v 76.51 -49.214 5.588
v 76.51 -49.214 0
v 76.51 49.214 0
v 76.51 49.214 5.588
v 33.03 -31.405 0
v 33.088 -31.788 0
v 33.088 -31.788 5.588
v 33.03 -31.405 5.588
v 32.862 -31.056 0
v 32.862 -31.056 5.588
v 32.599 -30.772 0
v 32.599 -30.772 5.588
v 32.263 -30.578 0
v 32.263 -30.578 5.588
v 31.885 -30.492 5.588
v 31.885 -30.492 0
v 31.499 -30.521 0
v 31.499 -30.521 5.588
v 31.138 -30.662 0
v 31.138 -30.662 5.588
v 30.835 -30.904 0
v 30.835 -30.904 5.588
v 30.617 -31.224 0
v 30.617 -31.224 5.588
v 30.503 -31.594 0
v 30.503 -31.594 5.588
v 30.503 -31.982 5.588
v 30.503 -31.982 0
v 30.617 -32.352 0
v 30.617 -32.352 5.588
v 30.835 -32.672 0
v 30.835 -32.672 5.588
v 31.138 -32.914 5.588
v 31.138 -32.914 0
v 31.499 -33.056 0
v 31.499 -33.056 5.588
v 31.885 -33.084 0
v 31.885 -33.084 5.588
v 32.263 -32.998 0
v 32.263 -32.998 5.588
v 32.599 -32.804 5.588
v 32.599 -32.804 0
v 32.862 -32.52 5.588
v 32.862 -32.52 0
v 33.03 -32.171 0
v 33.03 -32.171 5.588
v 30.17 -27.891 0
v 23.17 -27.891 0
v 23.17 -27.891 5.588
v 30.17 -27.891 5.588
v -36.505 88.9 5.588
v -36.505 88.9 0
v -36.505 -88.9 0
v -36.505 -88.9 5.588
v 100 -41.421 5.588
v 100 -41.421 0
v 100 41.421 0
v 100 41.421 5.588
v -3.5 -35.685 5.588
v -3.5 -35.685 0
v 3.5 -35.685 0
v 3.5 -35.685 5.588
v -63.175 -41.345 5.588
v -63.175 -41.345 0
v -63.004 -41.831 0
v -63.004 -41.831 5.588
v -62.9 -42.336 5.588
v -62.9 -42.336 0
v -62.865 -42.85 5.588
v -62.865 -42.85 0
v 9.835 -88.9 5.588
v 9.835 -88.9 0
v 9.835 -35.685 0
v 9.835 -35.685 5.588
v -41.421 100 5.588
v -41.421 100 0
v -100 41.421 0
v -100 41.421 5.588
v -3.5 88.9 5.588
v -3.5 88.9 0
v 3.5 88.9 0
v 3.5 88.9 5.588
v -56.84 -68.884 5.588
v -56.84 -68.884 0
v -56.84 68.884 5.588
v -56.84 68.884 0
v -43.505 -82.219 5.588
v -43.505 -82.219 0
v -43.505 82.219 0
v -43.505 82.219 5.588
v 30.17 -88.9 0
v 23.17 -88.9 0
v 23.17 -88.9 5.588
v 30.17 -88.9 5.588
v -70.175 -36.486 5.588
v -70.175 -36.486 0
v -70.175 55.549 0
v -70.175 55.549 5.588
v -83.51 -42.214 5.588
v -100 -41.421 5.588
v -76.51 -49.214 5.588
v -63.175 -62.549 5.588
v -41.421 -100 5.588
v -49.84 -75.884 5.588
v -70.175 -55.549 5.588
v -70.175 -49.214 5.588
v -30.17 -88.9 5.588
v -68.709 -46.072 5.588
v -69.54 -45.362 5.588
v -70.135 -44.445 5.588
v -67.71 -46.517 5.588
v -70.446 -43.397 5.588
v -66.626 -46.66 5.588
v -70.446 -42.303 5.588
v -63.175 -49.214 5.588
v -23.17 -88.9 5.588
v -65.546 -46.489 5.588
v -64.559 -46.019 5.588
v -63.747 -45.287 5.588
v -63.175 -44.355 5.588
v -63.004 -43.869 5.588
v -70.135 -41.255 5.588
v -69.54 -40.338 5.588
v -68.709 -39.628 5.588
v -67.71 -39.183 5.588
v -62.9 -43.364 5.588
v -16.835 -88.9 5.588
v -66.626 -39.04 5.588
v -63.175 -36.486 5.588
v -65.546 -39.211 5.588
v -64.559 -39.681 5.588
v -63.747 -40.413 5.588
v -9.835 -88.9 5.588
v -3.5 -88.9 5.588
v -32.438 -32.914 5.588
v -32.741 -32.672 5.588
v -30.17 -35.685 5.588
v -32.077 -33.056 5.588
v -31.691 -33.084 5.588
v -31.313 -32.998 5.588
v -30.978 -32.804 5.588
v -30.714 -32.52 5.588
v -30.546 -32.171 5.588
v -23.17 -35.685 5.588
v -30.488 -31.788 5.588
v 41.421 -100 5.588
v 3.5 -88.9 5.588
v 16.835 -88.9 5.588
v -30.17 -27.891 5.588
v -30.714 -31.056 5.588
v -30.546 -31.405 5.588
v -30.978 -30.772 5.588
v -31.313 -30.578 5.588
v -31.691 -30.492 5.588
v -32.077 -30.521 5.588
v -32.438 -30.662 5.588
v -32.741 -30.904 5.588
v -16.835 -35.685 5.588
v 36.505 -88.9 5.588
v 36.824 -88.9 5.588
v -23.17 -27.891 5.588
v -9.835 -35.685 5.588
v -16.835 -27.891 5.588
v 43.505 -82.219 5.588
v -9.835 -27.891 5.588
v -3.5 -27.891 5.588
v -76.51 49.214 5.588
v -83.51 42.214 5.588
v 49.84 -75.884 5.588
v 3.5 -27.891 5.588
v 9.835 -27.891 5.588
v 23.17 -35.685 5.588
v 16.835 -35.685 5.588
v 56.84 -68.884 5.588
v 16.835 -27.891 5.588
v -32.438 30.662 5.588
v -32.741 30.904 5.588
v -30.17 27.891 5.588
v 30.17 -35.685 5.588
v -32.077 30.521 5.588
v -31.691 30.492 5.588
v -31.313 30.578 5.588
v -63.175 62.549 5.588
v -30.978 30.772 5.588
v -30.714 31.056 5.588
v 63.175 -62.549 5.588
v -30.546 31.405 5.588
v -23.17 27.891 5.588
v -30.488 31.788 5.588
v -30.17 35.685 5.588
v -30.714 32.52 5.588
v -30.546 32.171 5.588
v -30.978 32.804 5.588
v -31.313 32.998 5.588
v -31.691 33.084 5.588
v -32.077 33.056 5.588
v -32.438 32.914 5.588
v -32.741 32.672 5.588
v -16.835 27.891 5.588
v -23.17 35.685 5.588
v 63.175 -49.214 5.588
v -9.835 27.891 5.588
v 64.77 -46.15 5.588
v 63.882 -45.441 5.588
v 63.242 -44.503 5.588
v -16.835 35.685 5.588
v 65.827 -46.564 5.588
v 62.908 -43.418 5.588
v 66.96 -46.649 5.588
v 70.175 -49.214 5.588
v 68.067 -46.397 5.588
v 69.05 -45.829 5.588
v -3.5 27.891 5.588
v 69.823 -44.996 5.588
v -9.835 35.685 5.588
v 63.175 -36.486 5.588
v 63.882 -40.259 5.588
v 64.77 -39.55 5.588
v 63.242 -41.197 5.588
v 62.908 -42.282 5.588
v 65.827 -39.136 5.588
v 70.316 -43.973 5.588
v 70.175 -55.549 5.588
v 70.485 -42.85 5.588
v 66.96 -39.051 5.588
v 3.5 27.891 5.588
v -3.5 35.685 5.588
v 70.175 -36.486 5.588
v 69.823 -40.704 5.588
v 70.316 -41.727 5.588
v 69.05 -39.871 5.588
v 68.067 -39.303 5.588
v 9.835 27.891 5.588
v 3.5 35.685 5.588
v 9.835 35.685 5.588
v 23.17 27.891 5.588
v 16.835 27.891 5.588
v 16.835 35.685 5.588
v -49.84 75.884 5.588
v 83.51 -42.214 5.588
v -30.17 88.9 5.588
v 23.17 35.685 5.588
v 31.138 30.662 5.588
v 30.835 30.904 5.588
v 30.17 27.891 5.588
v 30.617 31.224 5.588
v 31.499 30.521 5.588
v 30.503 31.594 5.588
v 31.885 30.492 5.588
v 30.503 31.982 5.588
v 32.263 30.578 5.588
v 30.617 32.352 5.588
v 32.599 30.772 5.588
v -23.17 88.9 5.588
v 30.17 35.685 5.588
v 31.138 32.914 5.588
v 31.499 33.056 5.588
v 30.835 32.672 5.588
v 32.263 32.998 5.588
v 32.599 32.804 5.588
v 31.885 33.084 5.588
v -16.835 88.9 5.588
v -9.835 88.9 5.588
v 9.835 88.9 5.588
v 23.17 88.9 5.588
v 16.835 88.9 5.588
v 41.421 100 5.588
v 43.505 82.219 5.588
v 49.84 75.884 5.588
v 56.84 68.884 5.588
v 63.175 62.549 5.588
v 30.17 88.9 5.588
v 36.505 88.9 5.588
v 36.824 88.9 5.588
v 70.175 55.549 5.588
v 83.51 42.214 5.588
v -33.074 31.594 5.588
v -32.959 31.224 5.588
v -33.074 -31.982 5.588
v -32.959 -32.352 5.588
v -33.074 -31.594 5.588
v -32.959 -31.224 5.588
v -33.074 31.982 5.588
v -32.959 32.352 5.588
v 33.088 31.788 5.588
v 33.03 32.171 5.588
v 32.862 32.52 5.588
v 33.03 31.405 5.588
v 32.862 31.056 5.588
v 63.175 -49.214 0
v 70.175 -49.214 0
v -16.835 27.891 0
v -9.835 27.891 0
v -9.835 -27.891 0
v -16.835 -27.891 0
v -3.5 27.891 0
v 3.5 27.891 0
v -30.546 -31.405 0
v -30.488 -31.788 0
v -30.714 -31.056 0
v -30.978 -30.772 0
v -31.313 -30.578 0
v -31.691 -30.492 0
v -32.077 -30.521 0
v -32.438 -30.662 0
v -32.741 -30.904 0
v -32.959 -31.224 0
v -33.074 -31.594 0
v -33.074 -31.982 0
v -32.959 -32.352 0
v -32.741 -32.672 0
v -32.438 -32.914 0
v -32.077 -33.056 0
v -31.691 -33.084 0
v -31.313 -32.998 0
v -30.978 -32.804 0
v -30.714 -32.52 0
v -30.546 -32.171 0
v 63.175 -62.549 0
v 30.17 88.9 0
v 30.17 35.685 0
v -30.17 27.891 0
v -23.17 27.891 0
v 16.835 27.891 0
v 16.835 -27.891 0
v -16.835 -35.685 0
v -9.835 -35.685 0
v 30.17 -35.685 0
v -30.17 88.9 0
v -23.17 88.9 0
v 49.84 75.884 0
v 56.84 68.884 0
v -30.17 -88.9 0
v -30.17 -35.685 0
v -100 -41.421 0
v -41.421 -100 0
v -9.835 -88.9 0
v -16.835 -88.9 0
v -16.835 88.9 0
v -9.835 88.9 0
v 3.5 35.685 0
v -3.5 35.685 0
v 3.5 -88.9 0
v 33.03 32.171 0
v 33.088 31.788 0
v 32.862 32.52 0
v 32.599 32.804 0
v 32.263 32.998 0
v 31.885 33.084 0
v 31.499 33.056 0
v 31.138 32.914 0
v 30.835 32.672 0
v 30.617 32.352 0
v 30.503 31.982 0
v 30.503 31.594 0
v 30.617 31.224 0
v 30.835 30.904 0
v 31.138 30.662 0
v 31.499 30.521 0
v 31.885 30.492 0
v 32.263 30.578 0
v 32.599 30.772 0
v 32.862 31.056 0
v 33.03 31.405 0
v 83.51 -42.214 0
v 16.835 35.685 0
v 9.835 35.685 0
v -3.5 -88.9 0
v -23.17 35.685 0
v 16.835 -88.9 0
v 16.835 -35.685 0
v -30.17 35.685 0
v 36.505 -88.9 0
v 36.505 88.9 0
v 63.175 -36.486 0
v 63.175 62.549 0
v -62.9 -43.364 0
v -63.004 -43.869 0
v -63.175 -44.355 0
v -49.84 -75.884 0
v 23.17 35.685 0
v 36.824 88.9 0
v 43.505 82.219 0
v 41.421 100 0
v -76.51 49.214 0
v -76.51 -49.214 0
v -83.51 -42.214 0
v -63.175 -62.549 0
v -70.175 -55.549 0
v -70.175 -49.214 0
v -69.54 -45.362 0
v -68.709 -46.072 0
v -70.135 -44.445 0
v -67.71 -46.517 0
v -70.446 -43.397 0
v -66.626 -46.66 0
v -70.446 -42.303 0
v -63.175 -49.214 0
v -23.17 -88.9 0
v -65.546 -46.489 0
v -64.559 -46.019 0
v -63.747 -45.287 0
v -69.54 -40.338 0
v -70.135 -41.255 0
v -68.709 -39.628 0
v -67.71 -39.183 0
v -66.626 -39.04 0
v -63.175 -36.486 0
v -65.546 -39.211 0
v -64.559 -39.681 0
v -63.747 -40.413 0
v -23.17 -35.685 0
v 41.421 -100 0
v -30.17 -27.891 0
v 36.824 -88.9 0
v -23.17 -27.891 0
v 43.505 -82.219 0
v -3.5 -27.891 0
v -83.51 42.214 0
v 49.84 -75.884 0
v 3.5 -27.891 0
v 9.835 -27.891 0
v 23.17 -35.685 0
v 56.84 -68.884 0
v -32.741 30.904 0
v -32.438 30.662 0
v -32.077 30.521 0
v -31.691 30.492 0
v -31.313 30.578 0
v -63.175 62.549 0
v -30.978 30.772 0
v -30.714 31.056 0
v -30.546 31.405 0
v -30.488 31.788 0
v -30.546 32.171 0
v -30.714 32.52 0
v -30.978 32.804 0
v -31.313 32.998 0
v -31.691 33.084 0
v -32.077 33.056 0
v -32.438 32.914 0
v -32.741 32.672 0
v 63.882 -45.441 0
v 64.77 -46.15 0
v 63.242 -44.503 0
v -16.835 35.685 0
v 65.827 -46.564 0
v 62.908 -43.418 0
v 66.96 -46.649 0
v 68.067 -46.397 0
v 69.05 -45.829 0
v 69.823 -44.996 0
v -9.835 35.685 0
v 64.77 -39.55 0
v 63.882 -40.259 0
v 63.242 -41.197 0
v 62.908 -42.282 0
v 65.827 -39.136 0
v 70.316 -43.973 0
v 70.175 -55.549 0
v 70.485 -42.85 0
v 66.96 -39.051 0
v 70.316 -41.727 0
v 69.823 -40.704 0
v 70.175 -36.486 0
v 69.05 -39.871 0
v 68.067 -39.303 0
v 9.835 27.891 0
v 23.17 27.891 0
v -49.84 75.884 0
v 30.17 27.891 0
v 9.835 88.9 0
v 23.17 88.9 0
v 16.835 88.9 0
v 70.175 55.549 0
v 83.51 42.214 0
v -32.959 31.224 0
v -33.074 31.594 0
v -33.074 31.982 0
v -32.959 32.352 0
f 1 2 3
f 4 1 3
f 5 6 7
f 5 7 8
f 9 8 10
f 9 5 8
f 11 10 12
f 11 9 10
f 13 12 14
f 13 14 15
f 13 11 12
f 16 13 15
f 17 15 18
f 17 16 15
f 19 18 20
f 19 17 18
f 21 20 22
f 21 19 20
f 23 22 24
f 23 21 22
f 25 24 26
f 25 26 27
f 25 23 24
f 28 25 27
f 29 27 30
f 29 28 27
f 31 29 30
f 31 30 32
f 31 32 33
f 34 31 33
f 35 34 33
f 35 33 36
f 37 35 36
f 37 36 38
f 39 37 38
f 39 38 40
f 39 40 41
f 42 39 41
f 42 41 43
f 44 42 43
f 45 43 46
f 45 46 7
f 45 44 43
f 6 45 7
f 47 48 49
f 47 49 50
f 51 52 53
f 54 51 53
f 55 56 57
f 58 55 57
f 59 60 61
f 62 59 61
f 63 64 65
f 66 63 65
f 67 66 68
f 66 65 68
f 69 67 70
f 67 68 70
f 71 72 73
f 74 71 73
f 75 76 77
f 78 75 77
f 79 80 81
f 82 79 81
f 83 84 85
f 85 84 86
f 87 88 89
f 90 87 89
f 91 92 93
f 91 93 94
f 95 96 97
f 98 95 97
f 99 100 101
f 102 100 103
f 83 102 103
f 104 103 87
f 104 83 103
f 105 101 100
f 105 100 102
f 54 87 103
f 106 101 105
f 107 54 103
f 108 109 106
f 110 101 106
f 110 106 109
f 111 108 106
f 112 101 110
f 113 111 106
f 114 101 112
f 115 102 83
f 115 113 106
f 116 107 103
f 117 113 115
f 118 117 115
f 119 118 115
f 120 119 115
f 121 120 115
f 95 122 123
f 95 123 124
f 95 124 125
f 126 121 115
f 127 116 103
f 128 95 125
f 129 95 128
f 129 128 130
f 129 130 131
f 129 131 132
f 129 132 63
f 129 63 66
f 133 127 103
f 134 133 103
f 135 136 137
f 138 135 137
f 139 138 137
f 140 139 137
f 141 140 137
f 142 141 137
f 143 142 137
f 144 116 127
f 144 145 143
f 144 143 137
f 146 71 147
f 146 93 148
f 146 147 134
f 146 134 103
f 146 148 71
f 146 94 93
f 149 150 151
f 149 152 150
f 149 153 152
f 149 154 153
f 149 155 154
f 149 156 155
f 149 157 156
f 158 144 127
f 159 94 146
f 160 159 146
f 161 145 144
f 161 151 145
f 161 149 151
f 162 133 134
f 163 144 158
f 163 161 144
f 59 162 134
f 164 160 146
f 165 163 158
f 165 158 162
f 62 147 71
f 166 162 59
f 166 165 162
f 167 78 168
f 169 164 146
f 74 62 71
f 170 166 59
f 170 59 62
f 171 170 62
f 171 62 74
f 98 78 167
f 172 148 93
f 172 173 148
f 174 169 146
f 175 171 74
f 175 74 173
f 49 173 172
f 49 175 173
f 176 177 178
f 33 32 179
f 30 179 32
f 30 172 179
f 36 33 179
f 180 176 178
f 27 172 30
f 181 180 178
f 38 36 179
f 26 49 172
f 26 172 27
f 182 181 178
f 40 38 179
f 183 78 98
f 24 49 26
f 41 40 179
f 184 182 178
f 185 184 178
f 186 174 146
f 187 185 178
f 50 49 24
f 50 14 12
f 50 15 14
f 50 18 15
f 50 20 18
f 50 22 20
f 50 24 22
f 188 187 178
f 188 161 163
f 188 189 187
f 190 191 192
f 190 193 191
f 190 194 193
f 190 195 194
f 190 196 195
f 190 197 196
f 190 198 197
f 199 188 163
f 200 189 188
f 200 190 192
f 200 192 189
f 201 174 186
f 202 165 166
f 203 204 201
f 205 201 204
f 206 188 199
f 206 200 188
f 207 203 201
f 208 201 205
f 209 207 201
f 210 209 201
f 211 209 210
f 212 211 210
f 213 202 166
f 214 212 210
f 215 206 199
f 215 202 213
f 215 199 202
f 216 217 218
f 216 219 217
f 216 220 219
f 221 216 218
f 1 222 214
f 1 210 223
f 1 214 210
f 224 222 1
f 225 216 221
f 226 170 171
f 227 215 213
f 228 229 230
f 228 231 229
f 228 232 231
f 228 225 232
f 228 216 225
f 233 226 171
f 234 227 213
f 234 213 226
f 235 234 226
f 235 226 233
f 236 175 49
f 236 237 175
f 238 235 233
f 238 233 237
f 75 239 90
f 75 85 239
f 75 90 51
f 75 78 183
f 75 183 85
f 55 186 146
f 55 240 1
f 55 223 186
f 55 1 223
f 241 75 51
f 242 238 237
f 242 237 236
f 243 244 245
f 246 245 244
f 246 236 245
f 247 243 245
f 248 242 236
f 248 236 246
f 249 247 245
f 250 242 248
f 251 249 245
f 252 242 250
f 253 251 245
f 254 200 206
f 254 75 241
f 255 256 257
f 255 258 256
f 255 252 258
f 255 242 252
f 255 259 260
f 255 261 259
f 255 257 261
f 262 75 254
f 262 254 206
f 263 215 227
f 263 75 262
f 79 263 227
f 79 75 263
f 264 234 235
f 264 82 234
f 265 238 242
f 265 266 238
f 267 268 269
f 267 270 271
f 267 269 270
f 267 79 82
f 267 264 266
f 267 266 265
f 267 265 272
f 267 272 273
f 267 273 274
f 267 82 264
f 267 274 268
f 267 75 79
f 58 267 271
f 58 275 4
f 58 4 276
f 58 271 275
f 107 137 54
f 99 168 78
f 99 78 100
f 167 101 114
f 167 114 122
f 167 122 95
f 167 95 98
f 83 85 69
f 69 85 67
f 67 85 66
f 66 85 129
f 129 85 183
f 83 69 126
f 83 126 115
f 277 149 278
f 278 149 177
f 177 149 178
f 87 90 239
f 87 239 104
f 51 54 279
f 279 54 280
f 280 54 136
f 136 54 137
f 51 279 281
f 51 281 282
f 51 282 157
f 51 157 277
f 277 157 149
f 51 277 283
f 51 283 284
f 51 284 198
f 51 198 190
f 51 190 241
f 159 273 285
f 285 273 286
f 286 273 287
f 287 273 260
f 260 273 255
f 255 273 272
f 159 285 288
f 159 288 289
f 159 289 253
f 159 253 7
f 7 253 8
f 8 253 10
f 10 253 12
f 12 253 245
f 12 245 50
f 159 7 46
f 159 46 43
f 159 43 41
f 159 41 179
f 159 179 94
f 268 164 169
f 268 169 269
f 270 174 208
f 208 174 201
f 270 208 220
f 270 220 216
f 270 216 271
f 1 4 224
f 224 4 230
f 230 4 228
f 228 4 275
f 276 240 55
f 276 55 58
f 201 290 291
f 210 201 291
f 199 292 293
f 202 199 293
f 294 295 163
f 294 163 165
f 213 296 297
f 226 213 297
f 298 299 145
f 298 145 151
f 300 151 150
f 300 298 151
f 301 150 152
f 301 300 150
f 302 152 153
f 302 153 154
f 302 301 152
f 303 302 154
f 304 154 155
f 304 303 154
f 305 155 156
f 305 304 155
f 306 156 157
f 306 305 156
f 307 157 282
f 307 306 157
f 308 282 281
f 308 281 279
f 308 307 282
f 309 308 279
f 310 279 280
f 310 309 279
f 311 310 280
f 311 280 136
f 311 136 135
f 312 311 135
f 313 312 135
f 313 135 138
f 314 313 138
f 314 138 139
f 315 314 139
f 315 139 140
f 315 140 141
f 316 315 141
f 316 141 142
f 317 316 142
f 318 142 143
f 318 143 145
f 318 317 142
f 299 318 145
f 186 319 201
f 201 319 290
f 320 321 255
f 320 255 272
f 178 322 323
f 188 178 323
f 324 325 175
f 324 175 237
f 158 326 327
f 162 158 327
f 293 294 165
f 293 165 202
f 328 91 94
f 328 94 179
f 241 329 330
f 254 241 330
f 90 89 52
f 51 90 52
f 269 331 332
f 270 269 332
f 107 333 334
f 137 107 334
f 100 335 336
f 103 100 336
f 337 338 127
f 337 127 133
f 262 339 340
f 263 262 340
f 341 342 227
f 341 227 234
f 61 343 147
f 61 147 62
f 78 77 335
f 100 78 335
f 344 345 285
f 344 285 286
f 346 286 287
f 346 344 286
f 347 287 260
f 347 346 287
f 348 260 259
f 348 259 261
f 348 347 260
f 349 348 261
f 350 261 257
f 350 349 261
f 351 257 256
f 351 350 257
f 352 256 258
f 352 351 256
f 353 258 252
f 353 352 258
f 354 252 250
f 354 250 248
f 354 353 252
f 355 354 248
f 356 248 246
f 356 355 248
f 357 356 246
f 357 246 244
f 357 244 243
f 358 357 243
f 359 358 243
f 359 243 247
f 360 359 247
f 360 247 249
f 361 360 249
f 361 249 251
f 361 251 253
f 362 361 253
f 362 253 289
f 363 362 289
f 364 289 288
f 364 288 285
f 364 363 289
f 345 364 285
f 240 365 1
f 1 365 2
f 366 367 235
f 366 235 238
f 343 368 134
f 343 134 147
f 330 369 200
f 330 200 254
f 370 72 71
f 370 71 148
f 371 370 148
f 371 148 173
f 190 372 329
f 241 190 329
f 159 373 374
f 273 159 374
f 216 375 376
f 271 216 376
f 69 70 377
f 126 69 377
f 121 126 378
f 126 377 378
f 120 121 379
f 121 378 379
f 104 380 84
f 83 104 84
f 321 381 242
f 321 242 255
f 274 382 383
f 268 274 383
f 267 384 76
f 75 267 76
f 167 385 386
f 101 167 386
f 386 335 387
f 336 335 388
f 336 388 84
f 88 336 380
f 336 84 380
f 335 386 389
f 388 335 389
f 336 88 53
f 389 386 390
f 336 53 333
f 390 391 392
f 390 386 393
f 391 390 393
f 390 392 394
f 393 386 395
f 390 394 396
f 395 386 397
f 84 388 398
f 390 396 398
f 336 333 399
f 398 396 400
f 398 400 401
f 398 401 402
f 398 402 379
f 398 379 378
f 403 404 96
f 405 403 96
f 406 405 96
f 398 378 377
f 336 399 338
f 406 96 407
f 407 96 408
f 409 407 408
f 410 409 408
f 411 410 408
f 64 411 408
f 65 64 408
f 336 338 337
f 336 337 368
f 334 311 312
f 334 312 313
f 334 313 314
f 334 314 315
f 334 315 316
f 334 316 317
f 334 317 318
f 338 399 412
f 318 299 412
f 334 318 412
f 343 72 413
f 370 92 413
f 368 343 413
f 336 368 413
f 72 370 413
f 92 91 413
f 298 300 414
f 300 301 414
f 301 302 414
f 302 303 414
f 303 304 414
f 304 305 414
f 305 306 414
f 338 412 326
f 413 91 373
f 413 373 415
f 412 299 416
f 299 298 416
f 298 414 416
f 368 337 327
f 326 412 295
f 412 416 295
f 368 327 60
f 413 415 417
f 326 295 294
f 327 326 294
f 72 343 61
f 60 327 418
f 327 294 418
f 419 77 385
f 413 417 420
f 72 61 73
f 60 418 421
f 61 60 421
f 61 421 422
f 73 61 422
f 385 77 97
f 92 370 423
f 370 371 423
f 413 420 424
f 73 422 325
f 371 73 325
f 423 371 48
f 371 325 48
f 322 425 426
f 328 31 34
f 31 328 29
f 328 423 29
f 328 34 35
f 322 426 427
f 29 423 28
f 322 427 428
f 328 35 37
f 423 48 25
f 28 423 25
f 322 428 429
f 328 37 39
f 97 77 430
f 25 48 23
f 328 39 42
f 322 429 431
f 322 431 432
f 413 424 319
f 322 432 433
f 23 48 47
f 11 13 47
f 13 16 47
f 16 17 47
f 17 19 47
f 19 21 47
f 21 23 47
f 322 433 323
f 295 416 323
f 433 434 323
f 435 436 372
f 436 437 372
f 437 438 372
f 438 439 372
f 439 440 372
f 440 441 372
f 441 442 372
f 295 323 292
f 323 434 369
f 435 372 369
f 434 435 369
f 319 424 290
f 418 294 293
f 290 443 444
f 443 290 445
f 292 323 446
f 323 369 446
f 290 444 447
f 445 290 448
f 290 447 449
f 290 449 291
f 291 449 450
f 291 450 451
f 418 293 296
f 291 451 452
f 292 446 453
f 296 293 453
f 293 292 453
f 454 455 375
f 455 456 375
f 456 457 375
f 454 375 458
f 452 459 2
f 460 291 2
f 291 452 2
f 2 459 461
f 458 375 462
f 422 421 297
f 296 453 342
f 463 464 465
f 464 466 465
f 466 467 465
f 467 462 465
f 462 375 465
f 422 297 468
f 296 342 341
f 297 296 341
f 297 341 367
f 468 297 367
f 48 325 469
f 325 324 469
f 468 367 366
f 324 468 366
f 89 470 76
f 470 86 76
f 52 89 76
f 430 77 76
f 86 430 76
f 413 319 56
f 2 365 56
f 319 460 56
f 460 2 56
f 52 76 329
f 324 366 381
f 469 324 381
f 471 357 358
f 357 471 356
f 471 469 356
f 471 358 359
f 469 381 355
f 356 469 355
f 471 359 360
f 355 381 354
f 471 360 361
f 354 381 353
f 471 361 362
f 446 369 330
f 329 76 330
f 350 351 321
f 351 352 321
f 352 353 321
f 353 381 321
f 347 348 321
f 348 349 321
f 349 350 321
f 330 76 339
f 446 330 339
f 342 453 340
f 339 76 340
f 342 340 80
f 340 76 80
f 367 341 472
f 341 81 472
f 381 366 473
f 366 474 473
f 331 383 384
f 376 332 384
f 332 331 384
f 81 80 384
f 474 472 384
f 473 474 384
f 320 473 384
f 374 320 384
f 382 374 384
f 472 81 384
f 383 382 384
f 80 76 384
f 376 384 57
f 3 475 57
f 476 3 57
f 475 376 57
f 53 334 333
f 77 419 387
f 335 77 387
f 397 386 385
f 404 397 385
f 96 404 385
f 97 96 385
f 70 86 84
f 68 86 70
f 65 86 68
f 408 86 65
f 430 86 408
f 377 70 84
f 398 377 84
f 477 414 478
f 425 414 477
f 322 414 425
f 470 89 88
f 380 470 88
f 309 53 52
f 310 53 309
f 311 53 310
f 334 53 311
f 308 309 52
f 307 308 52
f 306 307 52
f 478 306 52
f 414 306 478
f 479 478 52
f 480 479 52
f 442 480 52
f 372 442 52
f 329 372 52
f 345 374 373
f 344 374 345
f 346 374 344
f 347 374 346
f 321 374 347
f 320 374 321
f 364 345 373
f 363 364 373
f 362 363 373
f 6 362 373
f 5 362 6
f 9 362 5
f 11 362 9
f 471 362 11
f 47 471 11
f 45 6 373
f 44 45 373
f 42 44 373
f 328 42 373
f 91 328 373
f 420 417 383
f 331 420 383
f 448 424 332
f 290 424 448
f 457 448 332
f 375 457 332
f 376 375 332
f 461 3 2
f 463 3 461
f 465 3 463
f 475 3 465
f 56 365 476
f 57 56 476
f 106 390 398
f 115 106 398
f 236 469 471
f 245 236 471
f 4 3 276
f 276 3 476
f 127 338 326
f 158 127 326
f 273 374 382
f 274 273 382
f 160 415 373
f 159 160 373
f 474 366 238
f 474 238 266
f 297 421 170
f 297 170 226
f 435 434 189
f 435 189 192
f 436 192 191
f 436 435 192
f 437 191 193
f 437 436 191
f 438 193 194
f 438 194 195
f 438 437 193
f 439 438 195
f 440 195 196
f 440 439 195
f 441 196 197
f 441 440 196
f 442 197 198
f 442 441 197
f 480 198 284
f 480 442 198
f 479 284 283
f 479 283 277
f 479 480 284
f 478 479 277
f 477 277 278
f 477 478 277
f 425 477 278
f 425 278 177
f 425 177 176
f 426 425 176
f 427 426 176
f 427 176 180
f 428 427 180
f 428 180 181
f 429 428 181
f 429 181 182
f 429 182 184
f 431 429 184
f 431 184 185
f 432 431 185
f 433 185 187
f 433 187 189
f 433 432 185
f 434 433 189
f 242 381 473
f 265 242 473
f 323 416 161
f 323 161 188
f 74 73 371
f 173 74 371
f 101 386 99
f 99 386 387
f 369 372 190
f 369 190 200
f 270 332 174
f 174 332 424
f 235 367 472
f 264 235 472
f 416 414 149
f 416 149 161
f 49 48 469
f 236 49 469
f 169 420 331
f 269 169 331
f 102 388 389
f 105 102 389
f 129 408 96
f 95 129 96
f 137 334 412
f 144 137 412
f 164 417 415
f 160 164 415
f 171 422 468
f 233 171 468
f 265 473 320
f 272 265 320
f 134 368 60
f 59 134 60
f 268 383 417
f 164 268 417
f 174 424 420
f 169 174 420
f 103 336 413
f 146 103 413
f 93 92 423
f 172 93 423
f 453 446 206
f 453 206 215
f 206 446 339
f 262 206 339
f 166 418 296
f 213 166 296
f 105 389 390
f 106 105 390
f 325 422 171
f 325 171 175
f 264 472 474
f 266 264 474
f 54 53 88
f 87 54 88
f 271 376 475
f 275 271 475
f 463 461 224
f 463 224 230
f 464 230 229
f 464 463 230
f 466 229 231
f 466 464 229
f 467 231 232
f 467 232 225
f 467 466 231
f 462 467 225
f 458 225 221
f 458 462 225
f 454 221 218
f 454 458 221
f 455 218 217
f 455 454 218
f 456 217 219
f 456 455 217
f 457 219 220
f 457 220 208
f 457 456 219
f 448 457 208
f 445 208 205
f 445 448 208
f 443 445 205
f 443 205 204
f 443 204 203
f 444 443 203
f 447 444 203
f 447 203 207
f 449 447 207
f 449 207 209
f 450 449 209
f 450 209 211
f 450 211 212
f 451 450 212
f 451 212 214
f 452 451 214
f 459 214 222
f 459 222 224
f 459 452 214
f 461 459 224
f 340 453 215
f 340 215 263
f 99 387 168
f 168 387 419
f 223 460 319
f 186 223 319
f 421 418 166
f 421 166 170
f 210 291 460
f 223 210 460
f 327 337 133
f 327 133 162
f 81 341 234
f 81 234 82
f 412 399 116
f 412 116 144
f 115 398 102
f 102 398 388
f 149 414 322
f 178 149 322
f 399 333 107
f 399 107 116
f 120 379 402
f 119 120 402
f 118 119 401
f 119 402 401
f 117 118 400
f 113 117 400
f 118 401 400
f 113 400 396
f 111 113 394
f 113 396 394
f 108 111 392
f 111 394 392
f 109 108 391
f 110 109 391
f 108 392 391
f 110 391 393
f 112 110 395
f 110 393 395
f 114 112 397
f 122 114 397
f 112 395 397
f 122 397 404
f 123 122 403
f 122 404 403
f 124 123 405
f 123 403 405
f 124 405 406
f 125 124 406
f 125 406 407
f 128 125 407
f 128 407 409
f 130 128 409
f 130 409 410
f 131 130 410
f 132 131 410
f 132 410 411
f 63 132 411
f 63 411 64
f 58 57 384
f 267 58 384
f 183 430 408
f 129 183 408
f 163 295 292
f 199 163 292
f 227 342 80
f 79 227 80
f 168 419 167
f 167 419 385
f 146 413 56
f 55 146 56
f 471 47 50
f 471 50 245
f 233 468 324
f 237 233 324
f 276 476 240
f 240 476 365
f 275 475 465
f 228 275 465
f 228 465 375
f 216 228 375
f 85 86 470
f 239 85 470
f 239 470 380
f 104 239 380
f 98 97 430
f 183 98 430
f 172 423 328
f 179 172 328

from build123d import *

# Parameters (mm, degrees)
F0_W     = 7
F0_H     = 53.215195
F0_R     = 1.3
F0_R_2   = 3.81
F0_H_2   = 55.78279
F1_DEPTH = 5.588


with BuildPart() as f1:
    # F0 (on Top) → F1 (new body)
    with BuildSketch(Plane.XY):
        Polygon((41.421356, 100), (-41.421356, 100), (-100, 41.421356), (-100, -41.421356), (-41.421356, -100), (41.421356, -100), (100, -41.421356), (100, 41.421356), align=None)
        Polygon((-63.175, -49.213586), (-63.175, -62.548586), (-70.175, -55.548586), (-70.175, -49.213586), align=None, mode=Mode.SUBTRACT)
        with Locations((-26.67, -62.292402)):
            Rectangle(F0_W, F0_H, mode=Mode.SUBTRACT)
        with Locations((-13.335, -62.292402)):
            Rectangle(F0_W, F0_H, mode=Mode.SUBTRACT)
        with BuildLine():
            ThreePointArc((-63.175, -41.344643), (-62.943305, -42.081527), (-62.865, -42.85))
            ThreePointArc((-62.865, -42.85), (-62.943305, -43.618473), (-63.175, -44.355357))
            ThreePointArc((-63.175, -44.355357), (-70.485, -42.85), (-63.175, -41.344643))
        make_face(mode=Mode.SUBTRACT)
        with Locations((-31.7881, -31.7881)):
            Circle(F0_R, mode=Mode.SUBTRACT)
        with Locations((0, -62.292402)):
            Rectangle(F0_W, F0_H, mode=Mode.SUBTRACT)
        with Locations((13.335, -62.292402)):
            Rectangle(F0_W, F0_H, mode=Mode.SUBTRACT)
        with Locations((26.67, -62.292402)):
            Rectangle(F0_W, F0_H, mode=Mode.SUBTRACT)
        Polygon((70.175, -55.548586), (63.175, -62.548586), (63.175, -49.213586), (70.175, -49.213586), align=None, mode=Mode.SUBTRACT)
        with Locations((31.7881, -31.7881)):
            Circle(F0_R, mode=Mode.SUBTRACT)
        with Locations((66.675, -42.85)):
            Circle(F0_R_2, mode=Mode.SUBTRACT)
        Polygon((49.84, -75.883586), (49.84, 75.883586), (56.84, 68.883586), (56.84, -36.486414), (56.84, -49.213586), (56.84, -68.883586), align=None, mode=Mode.SUBTRACT)
        Polygon((76.51, 49.213586), (83.51, 42.213586), (83.51, -42.213586), (76.51, -49.213586), (76.51, -36.486414), align=None, mode=Mode.SUBTRACT)
        Polygon((-83.51, -42.213586), (-83.51, 42.213586), (-76.51, 49.213586), (-76.51, -36.486414), (-76.51, -49.213586), align=None, mode=Mode.SUBTRACT)
        Polygon((-56.84, -36.486414), (-56.84, 68.883586), (-49.84, 75.883586), (-49.84, -75.883586), (-56.84, -68.883586), (-56.84, -49.213586), align=None, mode=Mode.SUBTRACT)
        Polygon((-70.175, -36.486414), (-70.175, 55.548586), (-63.175, 62.548586), (-63.175, -36.486414), align=None, mode=Mode.SUBTRACT)
        Polygon((-43.505, 82.218586), (-36.505, 88.9), (-36.505, 35.684805), (-36.505, 27.891395), (-36.505, -27.891395), (-36.505, -35.684805), (-36.505, -88.9), (-43.505, -82.218586), align=None, mode=Mode.SUBTRACT)
        with Locations((-26.67, 0)):
            Rectangle(F0_W, F0_H_2, mode=Mode.SUBTRACT)
        with Locations((-13.335, 0)):
            Rectangle(F0_W, F0_H_2, mode=Mode.SUBTRACT)
        with Locations((-31.7881, 31.7881)):
            Circle(F0_R, mode=Mode.SUBTRACT)
        with Locations((-26.67, 62.292402)):
            Rectangle(F0_W, F0_H, mode=Mode.SUBTRACT)
        with Locations((-13.335, 62.292402)):
            Rectangle(F0_W, F0_H, mode=Mode.SUBTRACT)
        Rectangle(F0_W, F0_H_2, mode=Mode.SUBTRACT)
        with Locations((13.335, 0)):
            Rectangle(F0_W, F0_H_2, mode=Mode.SUBTRACT)
        with Locations((26.67, 0)):
            Rectangle(F0_W, F0_H_2, mode=Mode.SUBTRACT)
        Polygon((36.505, 35.684805), (36.505, 88.9), (36.823586, 88.9), (43.505, 82.218586), (43.505, -82.218586), (36.823586, -88.9), (36.505, -88.9), (36.505, -35.684805), (36.505, -27.891395), (36.505, 27.891395), align=None, mode=Mode.SUBTRACT)
        with Locations((31.7881, 31.7881)):
            Circle(F0_R, mode=Mode.SUBTRACT)
        Polygon((63.175, -36.486414), (63.175, 62.548586), (70.175, 55.548586), (70.175, -36.486414), align=None, mode=Mode.SUBTRACT)
        with Locations((0, 62.292402)):
            Rectangle(F0_W, F0_H, mode=Mode.SUBTRACT)
        with Locations((13.335, 62.292402)):
            Rectangle(F0_W, F0_H, mode=Mode.SUBTRACT)
        with Locations((26.67, 62.292402)):
            Rectangle(F0_W, F0_H, mode=Mode.SUBTRACT)
    extrude(amount=F1_DEPTH)


solid = f1.part
